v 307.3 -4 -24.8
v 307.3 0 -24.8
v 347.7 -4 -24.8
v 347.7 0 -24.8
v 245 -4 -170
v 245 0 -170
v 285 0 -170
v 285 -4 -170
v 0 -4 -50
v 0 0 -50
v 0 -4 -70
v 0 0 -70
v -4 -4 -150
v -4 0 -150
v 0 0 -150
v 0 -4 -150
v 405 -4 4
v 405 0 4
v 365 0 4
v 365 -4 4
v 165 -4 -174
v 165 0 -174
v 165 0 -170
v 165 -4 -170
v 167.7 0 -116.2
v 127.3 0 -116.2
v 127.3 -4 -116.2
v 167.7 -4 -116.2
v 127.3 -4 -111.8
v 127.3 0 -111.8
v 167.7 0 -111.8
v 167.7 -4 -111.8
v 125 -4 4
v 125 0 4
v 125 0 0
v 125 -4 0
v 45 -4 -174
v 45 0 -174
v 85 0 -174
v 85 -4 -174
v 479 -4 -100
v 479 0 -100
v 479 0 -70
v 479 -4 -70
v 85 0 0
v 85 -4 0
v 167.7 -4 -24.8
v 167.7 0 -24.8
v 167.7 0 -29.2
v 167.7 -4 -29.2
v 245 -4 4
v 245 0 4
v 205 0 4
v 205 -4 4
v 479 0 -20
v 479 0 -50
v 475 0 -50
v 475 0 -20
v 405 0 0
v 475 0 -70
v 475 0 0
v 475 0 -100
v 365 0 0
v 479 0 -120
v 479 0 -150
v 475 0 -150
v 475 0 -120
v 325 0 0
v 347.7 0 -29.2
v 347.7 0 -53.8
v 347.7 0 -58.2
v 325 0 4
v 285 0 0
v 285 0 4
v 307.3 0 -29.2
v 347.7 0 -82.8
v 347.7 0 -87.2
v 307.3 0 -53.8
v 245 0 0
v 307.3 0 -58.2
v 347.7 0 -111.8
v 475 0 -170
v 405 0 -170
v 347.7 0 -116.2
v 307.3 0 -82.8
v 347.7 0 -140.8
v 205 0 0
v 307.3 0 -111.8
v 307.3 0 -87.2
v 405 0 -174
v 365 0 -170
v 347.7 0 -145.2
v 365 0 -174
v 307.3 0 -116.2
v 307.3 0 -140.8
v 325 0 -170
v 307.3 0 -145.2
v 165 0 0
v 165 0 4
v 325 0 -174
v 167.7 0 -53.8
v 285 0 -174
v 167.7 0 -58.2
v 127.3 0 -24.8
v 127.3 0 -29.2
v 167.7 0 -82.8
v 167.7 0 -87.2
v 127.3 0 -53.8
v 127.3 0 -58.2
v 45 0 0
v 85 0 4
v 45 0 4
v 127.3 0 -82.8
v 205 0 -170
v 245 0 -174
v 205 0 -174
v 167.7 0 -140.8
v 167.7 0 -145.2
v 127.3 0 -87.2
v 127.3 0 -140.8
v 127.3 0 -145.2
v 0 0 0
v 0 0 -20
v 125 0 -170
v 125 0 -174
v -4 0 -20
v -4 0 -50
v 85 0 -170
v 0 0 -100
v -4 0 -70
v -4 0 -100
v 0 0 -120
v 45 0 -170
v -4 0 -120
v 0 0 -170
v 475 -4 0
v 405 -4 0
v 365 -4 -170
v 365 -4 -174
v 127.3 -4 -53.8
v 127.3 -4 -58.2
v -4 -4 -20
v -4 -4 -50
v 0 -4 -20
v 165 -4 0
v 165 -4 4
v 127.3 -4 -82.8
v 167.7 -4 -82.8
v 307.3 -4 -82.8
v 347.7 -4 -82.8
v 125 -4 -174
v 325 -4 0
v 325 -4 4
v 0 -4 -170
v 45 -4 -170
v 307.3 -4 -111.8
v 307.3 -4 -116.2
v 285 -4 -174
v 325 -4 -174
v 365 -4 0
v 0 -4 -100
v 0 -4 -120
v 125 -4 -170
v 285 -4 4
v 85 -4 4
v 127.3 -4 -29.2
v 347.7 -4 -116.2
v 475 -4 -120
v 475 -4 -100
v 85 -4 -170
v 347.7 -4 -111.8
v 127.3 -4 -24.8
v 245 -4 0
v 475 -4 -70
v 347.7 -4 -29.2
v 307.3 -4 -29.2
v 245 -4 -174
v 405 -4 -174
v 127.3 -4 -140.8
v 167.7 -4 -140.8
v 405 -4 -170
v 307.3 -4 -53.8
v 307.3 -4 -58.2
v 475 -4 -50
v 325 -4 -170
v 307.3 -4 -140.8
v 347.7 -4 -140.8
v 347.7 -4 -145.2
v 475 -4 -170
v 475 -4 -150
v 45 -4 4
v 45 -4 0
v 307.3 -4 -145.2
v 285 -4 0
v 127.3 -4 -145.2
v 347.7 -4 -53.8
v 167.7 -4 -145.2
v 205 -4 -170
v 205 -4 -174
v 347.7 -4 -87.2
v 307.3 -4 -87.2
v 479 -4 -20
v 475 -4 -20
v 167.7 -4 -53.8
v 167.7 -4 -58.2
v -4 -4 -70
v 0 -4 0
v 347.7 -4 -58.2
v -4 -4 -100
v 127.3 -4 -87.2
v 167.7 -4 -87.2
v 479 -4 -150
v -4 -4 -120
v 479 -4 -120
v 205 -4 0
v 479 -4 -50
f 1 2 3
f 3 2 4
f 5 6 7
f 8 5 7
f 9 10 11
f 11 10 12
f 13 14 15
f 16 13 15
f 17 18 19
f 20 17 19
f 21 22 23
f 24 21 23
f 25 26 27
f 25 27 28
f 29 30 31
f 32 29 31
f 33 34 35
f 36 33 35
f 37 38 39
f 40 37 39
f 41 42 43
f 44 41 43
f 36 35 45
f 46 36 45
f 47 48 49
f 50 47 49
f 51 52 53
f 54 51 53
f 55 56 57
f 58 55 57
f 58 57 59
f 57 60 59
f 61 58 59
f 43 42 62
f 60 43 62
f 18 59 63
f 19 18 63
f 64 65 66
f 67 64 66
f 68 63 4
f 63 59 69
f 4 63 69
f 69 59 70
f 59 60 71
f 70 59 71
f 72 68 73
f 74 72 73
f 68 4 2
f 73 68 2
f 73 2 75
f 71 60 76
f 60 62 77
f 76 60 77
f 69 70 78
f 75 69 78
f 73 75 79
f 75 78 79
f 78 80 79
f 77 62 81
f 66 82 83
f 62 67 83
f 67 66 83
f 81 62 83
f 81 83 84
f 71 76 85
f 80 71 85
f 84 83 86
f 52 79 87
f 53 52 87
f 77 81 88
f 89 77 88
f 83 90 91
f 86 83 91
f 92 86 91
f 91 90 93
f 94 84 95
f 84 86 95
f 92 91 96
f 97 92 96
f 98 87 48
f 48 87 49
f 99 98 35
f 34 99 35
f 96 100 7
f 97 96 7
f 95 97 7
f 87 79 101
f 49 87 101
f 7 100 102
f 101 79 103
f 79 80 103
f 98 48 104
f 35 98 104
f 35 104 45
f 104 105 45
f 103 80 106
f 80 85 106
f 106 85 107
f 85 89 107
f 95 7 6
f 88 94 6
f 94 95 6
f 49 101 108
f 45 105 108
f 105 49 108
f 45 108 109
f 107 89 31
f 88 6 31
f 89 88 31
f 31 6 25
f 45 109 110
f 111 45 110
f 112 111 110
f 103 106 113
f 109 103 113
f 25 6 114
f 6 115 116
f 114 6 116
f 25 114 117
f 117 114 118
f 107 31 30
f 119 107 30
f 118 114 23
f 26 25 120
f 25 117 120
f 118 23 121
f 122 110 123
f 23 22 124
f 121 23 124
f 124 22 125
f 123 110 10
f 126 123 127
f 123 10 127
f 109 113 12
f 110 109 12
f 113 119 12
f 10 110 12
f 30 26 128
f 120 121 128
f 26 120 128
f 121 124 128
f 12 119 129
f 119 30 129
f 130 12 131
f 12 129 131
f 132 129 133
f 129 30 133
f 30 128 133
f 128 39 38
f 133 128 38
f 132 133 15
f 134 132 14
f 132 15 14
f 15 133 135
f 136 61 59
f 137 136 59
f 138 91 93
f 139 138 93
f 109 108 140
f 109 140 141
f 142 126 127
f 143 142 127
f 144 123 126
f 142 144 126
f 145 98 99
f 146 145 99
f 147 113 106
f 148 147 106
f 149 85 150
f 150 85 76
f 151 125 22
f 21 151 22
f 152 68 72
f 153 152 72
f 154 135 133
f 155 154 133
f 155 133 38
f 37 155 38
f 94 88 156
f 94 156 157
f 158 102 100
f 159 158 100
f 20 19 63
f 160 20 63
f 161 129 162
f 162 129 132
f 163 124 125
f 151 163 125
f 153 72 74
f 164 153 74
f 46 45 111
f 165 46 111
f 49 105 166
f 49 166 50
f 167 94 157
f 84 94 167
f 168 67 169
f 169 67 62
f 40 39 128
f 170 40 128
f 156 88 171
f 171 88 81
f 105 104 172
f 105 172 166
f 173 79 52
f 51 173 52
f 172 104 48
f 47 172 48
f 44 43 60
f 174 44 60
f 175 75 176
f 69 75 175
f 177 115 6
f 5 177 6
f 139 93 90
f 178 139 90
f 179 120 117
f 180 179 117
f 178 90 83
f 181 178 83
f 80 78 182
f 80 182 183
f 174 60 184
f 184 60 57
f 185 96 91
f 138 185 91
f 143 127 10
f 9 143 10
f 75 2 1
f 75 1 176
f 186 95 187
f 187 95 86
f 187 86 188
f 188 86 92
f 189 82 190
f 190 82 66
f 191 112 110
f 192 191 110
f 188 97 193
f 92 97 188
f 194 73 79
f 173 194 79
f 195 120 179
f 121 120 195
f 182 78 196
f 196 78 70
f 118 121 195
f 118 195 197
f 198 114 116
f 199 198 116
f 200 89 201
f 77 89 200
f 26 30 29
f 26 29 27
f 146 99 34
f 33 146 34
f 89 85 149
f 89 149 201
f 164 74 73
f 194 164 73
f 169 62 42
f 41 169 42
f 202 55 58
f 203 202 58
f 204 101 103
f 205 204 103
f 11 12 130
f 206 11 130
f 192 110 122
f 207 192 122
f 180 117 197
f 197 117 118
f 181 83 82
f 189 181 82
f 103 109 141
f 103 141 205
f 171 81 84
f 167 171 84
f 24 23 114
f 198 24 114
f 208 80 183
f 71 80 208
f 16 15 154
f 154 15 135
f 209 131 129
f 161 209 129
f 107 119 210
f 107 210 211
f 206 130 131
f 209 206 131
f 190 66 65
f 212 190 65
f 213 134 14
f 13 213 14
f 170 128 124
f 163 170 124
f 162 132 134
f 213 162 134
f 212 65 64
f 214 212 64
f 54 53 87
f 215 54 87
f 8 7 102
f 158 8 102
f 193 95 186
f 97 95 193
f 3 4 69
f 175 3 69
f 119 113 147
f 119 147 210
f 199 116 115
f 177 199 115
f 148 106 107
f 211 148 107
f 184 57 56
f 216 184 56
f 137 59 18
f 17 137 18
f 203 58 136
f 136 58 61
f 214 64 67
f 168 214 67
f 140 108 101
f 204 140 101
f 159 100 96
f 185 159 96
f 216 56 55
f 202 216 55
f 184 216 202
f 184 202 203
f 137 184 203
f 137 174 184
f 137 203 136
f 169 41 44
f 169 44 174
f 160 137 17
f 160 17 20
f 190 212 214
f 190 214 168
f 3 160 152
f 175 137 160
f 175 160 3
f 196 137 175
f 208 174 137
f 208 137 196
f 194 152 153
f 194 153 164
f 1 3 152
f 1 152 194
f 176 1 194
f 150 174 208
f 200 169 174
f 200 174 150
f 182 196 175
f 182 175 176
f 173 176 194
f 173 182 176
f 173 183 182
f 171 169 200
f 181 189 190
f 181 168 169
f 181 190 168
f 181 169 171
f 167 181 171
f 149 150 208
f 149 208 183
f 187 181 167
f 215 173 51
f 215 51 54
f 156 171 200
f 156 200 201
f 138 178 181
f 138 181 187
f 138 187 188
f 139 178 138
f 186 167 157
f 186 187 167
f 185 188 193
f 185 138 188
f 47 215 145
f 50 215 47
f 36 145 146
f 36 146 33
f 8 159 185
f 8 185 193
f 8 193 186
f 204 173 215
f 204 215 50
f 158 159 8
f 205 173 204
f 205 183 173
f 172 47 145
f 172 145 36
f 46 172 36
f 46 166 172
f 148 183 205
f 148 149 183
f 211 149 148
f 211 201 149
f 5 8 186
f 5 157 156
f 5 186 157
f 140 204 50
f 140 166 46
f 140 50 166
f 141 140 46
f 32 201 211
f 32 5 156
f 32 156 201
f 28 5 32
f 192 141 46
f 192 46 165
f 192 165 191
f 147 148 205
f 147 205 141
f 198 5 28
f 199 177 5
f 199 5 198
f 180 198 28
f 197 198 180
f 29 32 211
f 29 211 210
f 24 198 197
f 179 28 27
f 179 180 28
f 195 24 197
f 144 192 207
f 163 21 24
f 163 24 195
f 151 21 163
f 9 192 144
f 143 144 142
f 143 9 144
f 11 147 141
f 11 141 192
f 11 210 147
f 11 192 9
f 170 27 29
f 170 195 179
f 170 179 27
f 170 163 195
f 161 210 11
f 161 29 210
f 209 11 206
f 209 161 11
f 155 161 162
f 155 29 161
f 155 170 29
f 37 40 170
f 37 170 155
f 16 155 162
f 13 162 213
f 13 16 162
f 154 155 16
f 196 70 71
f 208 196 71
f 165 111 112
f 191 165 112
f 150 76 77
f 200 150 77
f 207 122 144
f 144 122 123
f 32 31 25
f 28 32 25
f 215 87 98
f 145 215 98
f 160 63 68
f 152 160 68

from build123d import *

# Parameters (mm, degrees)
EXTRUDE_1_DEPTH     = 4
SKETCH_3_W          = 40.4
SKETCH_3_H          = 4.4
CUT_EXTRUDE_1_DEPTH = 510.640069068


with BuildPart() as part:
    # Эскиз1 → Бобышка-Вытянуть1 (new body)
    with BuildSketch(Plane(origin=(0, 0, 0), x_dir=(1, 0, 0), z_dir=(0, 1, 0))):
        Polygon((0, 0), (0, 20), (-4, 20), (-4, 50), (0, 50), (0, 70), (-4, 70), (-4, 100), (0, 100), (0, 120), (-4, 120), (-4, 150), (0, 150), (0, 170), (45, 170), (45, 174), (85, 174), (85, 170), (125, 170), (125, 174), (165, 174), (165, 170), (205, 170), (205, 174), (245, 174), (245, 170), (285, 170), (285, 174), (325, 174), (325, 170), (365, 170), (365, 174), (405, 174), (405, 170), (475, 170), (475, 150), (479, 150), (479, 120), (475, 120), (475, 100), (479, 100), (479, 70), (475, 70), (475, 50), (479, 50), (479, 20), (475, 20), (475, 0), (405, 0), (405, -4), (365, -4), (365, 0), (325, 0), (325, -4), (285, -4), (285, 0), (245, 0), (245, -4), (205, -4), (205, 0), (165, 0), (165, -4), (125, -4), (125, 0), (85, 0), (85, -4), (45, -4), (45, 0), align=None)
    extrude(amount=-EXTRUDE_1_DEPTH)

    # Эскиз3 → Вырез-Вытянуть1 (cut, through all)
    with BuildSketch(Plane(origin=(0, 0, 0), x_dir=(1, 0, 0), z_dir=(0, 1, 0))):
        with Locations((147.5, 27)):
            Rectangle(SKETCH_3_W, SKETCH_3_H)
        with Locations((327.5, 27)):
            Rectangle(SKETCH_3_W, SKETCH_3_H)
        with Locations((147.5, 56)):
            Rectangle(SKETCH_3_W, SKETCH_3_H)
        with Locations((327.5, 56)):
            Rectangle(SKETCH_3_W, SKETCH_3_H)
        with Locations((147.5, 85)):
            Rectangle(SKETCH_3_W, SKETCH_3_H)
        with Locations((327.5, 85)):
            Rectangle(SKETCH_3_W, SKETCH_3_H)
        with Locations((147.5, 114)):
            Rectangle(SKETCH_3_W, SKETCH_3_H)
        with Locations((327.5, 114)):
            Rectangle(SKETCH_3_W, SKETCH_3_H)
        with Locations((147.5, 143)):
            Rectangle(SKETCH_3_W, SKETCH_3_H)
        with Locations((327.5, 143)):
            Rectangle(SKETCH_3_W, SKETCH_3_H)
    extrude(amount=-CUT_EXTRUDE_1_DEPTH, mode=Mode.SUBTRACT)


solid = part.part
